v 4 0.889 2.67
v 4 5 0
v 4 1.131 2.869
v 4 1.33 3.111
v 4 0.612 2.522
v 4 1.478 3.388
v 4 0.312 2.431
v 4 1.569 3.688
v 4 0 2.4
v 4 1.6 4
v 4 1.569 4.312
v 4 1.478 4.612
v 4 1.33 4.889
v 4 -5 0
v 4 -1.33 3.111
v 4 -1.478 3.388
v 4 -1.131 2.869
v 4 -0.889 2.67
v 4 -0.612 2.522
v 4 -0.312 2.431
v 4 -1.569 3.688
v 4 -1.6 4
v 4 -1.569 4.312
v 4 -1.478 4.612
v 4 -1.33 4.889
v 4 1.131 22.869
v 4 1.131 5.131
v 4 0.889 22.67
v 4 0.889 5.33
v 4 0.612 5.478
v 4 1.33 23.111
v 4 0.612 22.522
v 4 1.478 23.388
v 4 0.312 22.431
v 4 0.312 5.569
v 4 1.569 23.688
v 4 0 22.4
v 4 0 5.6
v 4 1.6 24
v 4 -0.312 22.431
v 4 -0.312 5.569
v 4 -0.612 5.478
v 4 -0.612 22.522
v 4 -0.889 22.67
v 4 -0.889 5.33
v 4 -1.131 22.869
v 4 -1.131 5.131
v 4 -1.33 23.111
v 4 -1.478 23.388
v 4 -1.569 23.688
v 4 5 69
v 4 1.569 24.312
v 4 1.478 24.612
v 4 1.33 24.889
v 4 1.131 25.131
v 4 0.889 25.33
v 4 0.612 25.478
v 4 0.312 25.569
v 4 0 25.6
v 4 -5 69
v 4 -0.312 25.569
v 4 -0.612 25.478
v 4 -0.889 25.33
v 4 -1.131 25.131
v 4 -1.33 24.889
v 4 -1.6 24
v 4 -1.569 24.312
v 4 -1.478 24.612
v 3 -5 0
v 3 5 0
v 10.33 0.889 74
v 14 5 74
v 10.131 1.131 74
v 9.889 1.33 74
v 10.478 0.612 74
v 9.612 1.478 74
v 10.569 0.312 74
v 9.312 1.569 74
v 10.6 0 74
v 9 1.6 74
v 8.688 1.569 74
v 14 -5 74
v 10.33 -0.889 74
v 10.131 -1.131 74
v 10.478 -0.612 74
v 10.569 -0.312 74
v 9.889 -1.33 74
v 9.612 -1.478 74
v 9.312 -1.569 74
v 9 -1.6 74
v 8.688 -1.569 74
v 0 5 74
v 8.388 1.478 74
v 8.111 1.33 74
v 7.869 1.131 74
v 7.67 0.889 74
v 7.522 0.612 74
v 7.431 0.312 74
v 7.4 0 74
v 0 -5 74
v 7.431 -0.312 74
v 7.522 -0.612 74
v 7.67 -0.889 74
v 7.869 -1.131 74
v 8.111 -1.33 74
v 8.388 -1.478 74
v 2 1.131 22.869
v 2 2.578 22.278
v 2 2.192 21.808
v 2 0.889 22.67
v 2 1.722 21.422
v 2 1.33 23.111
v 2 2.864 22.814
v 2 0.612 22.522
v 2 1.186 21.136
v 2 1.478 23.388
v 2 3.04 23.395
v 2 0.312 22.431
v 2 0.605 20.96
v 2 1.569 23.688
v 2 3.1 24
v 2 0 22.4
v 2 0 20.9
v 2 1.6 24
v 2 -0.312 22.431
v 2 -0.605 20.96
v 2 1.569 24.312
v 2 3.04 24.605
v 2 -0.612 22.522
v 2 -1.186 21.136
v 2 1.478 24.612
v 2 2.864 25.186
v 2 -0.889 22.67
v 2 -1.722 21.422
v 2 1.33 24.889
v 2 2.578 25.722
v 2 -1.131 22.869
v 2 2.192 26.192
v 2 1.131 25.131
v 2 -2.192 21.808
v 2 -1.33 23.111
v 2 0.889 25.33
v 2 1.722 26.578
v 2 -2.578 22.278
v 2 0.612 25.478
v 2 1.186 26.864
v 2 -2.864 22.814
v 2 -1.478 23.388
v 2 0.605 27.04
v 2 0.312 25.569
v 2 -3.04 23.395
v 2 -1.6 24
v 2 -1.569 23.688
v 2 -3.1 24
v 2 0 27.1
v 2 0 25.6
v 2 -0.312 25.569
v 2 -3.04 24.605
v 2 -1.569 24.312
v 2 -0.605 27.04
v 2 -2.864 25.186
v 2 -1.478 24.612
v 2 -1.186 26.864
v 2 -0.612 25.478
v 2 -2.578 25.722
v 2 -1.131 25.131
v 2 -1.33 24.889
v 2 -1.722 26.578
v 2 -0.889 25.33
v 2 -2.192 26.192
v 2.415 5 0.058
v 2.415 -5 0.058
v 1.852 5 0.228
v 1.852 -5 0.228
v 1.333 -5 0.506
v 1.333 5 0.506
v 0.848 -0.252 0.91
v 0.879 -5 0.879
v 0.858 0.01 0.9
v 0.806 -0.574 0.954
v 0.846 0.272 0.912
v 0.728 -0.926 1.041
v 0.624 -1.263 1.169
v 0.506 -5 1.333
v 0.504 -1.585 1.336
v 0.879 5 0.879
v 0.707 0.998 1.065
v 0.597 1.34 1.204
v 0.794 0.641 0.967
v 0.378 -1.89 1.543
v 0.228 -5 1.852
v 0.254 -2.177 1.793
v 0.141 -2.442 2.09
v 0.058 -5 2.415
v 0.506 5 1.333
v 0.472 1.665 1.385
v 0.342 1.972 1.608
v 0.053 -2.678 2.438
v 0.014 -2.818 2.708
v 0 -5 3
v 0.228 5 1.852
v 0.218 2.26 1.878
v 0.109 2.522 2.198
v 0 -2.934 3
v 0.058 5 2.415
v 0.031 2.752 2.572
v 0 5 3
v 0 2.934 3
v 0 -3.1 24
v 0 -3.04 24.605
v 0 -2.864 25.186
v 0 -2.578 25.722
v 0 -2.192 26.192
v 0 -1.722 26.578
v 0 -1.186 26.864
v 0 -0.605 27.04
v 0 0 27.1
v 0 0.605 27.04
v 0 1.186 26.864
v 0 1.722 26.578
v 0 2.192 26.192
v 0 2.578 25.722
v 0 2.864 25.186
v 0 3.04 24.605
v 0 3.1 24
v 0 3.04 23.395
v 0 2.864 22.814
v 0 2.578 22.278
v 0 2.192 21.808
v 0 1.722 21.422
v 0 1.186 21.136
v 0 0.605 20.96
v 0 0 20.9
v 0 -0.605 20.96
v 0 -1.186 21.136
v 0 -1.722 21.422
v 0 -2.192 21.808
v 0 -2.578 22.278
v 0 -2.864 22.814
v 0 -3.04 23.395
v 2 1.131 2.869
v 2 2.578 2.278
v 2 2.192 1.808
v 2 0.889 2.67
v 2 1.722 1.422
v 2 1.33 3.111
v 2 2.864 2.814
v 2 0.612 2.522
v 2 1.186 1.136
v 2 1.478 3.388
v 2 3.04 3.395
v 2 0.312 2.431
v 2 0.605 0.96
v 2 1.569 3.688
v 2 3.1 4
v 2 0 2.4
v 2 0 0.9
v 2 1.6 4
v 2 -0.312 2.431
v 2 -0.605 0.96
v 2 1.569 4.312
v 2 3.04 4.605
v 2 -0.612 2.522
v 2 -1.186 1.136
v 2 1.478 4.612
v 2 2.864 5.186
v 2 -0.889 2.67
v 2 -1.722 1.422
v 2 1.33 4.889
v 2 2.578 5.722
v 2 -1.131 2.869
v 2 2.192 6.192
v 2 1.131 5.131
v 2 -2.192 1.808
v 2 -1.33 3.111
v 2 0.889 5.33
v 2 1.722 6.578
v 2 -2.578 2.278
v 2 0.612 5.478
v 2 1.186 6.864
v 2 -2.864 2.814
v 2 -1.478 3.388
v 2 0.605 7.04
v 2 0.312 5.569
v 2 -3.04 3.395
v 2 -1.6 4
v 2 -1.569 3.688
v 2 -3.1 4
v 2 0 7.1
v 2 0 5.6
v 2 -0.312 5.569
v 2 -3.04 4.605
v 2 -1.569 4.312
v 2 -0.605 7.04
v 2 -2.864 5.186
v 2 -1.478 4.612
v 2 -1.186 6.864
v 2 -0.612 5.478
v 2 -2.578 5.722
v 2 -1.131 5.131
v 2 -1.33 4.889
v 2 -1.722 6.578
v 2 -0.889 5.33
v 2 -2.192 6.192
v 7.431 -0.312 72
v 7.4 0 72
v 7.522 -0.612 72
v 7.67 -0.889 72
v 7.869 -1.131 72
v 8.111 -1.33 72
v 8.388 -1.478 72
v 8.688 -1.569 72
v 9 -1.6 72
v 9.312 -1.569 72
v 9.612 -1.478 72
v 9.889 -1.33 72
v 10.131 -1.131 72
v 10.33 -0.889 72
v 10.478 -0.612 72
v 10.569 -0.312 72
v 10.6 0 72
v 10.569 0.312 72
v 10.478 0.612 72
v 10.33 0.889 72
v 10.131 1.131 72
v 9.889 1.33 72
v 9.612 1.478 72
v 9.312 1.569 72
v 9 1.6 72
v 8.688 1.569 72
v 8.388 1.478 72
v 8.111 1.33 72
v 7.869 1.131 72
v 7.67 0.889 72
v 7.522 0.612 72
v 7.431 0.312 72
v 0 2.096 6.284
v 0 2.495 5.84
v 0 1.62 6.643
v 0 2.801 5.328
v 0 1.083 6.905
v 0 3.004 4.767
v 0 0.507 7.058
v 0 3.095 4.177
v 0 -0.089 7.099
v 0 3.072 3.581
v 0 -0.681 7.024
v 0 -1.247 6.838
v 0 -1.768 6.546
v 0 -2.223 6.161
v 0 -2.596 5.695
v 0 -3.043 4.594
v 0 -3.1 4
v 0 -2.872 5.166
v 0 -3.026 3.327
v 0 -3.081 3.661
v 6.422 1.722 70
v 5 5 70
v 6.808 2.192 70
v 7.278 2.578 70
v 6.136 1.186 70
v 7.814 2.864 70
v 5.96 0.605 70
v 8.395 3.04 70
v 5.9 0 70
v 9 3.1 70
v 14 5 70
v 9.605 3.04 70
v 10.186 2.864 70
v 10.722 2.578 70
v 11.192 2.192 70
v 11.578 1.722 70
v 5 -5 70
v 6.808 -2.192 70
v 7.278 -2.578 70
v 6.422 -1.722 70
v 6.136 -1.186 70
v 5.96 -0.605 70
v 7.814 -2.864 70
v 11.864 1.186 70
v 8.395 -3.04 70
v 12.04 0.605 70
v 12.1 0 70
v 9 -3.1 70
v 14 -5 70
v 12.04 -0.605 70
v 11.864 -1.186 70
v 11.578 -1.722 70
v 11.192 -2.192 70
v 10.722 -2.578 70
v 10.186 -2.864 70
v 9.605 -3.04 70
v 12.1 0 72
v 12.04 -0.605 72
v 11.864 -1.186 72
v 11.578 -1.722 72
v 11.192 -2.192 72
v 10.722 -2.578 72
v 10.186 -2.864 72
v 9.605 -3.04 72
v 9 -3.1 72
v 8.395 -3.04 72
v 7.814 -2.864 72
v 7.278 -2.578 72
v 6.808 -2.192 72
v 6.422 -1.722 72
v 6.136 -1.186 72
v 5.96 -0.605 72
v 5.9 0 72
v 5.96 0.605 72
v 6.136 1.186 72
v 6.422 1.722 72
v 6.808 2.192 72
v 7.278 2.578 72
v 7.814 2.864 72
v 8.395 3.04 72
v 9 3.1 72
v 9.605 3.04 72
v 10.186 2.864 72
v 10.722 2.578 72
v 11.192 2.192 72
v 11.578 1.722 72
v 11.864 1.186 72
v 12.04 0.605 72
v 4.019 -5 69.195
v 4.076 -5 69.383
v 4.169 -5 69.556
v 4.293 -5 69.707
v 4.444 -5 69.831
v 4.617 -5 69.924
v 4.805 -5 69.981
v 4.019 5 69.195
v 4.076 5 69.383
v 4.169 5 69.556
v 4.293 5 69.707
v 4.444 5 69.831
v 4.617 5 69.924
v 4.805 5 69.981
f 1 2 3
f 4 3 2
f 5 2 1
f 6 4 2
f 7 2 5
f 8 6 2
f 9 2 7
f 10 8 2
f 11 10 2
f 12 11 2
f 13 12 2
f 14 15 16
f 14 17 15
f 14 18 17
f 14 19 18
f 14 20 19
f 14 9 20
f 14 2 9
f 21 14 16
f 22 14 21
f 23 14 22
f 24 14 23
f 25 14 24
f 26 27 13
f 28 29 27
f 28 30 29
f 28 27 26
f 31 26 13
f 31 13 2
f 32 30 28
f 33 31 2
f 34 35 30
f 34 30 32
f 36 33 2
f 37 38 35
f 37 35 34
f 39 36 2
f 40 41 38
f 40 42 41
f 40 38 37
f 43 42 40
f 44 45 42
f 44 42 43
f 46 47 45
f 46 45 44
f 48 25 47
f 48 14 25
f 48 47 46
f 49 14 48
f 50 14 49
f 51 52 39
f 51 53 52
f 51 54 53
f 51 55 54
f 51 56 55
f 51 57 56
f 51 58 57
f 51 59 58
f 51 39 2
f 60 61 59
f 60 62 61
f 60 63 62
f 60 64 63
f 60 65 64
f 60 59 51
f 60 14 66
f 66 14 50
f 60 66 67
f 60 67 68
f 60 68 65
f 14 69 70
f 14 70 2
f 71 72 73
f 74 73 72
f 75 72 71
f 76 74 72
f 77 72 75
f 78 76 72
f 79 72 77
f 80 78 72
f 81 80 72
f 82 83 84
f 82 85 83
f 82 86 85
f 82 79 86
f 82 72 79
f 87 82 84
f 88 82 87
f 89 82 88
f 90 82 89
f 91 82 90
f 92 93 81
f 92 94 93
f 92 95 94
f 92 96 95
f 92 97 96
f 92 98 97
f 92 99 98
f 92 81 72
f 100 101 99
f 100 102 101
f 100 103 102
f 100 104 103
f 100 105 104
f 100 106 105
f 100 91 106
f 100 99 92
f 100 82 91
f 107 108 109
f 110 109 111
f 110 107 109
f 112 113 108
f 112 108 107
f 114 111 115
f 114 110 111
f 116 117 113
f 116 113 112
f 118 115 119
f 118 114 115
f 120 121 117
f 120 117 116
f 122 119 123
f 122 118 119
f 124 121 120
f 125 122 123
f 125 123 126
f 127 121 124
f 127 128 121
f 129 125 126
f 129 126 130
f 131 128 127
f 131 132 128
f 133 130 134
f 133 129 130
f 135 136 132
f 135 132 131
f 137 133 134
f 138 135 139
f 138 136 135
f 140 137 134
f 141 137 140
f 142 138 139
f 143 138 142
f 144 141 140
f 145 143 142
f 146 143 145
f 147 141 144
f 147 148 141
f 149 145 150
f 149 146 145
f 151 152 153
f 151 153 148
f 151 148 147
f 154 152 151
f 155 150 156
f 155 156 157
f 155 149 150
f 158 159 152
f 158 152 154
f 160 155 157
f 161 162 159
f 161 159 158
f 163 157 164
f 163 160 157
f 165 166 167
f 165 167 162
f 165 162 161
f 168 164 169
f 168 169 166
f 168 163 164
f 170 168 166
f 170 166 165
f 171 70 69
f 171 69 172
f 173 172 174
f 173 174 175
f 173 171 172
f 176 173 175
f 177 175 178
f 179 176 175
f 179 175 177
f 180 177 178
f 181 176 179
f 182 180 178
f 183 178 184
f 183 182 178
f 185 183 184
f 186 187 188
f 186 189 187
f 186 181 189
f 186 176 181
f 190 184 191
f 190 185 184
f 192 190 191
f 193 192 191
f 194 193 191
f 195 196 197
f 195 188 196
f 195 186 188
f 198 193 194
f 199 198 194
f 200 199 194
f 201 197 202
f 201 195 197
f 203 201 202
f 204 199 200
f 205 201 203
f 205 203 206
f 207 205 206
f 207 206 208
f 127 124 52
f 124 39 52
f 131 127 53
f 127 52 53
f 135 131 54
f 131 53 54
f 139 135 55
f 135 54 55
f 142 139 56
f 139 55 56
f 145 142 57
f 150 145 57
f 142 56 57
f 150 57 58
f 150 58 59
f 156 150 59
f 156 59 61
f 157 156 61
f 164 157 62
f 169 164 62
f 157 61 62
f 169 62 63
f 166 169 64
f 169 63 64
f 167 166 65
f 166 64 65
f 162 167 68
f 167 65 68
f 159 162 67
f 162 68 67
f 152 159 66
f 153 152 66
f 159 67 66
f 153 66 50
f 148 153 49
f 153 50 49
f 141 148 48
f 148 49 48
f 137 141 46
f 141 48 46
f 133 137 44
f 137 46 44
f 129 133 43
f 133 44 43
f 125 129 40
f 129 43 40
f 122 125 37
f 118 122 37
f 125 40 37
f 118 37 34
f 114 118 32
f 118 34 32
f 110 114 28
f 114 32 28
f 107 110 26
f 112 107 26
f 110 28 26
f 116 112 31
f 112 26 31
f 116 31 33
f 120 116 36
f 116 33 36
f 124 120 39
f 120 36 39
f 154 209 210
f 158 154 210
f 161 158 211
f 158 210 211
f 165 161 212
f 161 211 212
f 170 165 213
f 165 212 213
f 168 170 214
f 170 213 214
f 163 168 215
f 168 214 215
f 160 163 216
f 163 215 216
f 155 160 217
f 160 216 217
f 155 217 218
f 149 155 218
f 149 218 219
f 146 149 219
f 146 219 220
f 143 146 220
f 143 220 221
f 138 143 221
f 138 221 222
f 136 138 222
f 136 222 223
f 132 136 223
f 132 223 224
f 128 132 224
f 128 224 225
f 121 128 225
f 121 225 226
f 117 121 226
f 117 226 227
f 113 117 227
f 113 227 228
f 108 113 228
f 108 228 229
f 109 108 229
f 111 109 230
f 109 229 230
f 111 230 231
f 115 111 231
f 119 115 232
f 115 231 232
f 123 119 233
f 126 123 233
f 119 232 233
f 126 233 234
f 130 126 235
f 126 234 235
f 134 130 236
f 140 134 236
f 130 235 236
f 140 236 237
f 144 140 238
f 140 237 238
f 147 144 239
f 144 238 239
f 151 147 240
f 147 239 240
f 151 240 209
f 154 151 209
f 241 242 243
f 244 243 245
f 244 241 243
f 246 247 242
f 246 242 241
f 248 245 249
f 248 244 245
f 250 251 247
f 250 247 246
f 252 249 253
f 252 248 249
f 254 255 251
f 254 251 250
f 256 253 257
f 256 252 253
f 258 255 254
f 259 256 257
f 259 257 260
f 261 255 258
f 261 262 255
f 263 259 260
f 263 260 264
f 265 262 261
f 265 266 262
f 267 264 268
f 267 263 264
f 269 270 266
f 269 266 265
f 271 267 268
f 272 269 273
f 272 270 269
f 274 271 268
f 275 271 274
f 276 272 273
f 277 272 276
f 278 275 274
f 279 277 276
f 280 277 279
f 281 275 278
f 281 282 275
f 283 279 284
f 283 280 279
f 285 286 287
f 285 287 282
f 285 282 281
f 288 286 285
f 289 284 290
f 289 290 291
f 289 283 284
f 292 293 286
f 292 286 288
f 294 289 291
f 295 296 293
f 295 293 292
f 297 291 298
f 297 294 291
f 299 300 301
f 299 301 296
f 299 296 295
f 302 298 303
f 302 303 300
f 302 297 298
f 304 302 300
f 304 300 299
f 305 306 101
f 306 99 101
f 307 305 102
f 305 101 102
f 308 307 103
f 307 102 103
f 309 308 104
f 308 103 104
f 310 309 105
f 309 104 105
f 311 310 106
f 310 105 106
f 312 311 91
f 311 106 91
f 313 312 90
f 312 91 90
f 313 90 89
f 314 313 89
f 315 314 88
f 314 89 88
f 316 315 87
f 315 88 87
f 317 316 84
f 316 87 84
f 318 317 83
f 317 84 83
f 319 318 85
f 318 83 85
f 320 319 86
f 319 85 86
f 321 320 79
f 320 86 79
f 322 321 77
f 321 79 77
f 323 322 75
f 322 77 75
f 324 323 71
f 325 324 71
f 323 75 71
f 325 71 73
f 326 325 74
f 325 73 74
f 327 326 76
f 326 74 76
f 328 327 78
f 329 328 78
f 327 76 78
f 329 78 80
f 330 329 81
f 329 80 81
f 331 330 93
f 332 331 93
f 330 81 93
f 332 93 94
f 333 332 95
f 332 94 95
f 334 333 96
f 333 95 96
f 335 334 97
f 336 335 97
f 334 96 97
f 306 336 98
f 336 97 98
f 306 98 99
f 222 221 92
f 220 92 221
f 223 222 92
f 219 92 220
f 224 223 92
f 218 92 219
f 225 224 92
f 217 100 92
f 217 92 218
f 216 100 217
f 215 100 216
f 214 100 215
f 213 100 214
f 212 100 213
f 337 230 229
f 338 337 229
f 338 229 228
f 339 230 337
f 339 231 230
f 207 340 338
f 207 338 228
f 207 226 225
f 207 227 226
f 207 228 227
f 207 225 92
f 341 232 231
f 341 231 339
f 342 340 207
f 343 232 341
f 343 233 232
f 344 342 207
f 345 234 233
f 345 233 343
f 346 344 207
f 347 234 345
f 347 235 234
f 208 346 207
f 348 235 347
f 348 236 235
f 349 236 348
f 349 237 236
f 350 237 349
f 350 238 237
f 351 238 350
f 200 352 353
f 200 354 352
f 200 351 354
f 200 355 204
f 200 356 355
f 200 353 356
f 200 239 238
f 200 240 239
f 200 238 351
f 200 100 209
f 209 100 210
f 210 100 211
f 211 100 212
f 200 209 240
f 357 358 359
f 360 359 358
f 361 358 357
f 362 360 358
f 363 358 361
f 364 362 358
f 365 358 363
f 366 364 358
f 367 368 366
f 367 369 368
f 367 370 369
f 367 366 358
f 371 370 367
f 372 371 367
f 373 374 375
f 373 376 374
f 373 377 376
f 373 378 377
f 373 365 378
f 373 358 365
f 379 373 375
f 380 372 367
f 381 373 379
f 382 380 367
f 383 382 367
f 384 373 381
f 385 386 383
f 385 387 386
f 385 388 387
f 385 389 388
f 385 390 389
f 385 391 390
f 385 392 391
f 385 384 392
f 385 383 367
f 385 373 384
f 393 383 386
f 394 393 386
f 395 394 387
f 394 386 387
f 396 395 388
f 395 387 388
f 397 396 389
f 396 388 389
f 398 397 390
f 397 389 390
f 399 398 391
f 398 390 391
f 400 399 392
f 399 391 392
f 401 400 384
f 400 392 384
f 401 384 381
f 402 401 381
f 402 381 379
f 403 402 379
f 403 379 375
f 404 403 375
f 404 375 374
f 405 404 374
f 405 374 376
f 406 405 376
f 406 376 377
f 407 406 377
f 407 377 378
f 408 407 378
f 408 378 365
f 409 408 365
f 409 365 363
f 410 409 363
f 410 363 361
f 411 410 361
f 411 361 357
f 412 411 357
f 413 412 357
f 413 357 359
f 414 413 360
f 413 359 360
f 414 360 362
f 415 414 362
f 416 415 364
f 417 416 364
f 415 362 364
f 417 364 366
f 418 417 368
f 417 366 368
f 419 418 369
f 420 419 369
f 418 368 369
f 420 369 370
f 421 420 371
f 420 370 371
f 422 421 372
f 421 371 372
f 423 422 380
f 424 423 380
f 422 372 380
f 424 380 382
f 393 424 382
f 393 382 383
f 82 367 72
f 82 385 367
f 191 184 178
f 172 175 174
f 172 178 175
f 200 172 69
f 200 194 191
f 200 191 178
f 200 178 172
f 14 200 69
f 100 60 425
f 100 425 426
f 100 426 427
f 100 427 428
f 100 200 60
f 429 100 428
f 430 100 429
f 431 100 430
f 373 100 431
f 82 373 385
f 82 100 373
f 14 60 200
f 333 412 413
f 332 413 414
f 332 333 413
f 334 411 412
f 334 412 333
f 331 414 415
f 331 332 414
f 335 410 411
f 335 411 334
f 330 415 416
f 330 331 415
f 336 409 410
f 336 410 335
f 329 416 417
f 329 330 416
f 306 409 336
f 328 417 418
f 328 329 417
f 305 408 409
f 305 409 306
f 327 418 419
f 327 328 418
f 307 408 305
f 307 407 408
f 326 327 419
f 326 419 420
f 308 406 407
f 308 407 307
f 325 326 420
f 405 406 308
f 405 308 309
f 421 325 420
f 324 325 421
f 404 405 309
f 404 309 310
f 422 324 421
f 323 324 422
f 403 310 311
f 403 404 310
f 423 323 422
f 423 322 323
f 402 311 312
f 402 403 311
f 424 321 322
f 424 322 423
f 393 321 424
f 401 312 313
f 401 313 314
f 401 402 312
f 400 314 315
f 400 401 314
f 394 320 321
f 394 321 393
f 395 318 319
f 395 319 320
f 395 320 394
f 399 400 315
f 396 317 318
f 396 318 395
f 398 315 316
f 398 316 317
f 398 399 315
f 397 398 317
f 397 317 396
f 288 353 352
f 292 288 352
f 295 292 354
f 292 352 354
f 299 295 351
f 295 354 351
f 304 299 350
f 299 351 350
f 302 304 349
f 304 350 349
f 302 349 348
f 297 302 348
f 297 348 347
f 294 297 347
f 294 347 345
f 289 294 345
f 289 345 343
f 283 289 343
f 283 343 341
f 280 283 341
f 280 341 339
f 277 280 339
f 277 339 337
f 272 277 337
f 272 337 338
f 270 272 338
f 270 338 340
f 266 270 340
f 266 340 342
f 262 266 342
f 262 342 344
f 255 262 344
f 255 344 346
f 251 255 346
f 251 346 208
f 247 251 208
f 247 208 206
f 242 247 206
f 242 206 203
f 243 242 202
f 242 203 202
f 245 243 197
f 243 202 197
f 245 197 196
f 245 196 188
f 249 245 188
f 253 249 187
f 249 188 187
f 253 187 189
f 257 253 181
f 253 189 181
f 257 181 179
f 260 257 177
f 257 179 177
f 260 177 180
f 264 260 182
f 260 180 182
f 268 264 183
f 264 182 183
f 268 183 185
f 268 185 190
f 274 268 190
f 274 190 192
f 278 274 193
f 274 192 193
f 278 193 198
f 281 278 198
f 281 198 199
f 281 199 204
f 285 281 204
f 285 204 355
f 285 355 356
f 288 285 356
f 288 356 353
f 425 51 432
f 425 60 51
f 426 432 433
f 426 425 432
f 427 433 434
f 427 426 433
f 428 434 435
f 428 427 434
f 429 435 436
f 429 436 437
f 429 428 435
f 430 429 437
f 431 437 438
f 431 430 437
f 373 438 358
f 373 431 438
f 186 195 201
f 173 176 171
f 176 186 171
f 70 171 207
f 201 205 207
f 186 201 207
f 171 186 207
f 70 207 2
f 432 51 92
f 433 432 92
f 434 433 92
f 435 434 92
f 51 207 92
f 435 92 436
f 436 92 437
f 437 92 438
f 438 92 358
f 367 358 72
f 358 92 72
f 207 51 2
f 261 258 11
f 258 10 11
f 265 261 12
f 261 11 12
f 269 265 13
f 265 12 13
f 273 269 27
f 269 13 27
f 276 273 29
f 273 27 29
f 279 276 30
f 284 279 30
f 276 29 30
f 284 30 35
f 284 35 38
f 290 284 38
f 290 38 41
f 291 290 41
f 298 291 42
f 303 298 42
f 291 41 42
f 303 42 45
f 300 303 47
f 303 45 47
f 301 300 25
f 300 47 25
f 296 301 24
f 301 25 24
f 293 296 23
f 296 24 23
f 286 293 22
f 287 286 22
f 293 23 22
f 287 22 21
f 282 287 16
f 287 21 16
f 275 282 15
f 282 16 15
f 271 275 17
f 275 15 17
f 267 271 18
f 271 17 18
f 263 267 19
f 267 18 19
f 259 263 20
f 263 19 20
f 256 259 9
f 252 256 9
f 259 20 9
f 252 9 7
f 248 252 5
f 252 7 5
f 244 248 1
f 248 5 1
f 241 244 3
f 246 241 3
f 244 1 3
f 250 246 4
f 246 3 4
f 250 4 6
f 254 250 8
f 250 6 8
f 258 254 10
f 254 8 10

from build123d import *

# Parameters (mm, degrees)
F1_DEPTH             = 5
F4_D                 = 3.2
F4_CBORE_D           = 6.2
F4_CBORE_DEPTH       = 2
F4_ON_F3_D           = 3.2
F4_ON_F3_CBORE_D     = 6.2
F4_ON_F3_CBORE_DEPTH = 2
F5_R                 = 1
F6_T1_DEPTH          = 25


# Not quite as in the source:
# - a fillet or chamfer that OpenCascade refuses, or shapes differently, is made with other operations: its cross-section is extruded or revolved along the edge and cut away or added


with BuildPart() as f1:
    # F0 (on Front) → F1 (new body, symmetric)
    with BuildSketch(Plane.XZ):
        Polygon((0, 74), (0, 0), (4, 0), (4, 70), (14, 70), (14, 74), align=None)
    extrude(amount=F1_DEPTH, both=True)

    # F4 (through all)
    with Locations(Plane(origin=(0, 0, 0), x_dir=(0, -1, 0), z_dir=(-1, 0, 0))):
        with Locations((0, 24), (0, 4)):
            CounterBoreHole(F4_D / 2, F4_CBORE_D / 2, F4_CBORE_DEPTH)

    # F4 on F3 (through all)
    with Locations(Plane(origin=(0, 0, 70), x_dir=(1, 0, 0), z_dir=(0, 0, -1))):
        with Locations((9, 0)):
            CounterBoreHole(F4_ON_F3_D / 2, F4_ON_F3_CBORE_D / 2, F4_ON_F3_CBORE_DEPTH)

    # F5
    f5_edges = [f1.edges().sort_by_distance(p)[0] for p in [
        (4, 0, 70),
    ]]
    fillet(f5_edges, radius=F5_R)

    # F6: fillet of radius 3 on 1 edges, made by hand

    # F6_s2 → F6_t1 (cut)
    with BuildSketch(Plane.XZ.offset(-12.5)):
        with BuildLine():
            ThreePointArc((3, 0), (0.8786796564, 0.8786796564), (0, 3))
            Line((0, 3), (0, 0))
            Line((0, 0), (3, 0))
        make_face()
    extrude(amount=F6_T1_DEPTH, mode=Mode.SUBTRACT)


solid = f1.part
